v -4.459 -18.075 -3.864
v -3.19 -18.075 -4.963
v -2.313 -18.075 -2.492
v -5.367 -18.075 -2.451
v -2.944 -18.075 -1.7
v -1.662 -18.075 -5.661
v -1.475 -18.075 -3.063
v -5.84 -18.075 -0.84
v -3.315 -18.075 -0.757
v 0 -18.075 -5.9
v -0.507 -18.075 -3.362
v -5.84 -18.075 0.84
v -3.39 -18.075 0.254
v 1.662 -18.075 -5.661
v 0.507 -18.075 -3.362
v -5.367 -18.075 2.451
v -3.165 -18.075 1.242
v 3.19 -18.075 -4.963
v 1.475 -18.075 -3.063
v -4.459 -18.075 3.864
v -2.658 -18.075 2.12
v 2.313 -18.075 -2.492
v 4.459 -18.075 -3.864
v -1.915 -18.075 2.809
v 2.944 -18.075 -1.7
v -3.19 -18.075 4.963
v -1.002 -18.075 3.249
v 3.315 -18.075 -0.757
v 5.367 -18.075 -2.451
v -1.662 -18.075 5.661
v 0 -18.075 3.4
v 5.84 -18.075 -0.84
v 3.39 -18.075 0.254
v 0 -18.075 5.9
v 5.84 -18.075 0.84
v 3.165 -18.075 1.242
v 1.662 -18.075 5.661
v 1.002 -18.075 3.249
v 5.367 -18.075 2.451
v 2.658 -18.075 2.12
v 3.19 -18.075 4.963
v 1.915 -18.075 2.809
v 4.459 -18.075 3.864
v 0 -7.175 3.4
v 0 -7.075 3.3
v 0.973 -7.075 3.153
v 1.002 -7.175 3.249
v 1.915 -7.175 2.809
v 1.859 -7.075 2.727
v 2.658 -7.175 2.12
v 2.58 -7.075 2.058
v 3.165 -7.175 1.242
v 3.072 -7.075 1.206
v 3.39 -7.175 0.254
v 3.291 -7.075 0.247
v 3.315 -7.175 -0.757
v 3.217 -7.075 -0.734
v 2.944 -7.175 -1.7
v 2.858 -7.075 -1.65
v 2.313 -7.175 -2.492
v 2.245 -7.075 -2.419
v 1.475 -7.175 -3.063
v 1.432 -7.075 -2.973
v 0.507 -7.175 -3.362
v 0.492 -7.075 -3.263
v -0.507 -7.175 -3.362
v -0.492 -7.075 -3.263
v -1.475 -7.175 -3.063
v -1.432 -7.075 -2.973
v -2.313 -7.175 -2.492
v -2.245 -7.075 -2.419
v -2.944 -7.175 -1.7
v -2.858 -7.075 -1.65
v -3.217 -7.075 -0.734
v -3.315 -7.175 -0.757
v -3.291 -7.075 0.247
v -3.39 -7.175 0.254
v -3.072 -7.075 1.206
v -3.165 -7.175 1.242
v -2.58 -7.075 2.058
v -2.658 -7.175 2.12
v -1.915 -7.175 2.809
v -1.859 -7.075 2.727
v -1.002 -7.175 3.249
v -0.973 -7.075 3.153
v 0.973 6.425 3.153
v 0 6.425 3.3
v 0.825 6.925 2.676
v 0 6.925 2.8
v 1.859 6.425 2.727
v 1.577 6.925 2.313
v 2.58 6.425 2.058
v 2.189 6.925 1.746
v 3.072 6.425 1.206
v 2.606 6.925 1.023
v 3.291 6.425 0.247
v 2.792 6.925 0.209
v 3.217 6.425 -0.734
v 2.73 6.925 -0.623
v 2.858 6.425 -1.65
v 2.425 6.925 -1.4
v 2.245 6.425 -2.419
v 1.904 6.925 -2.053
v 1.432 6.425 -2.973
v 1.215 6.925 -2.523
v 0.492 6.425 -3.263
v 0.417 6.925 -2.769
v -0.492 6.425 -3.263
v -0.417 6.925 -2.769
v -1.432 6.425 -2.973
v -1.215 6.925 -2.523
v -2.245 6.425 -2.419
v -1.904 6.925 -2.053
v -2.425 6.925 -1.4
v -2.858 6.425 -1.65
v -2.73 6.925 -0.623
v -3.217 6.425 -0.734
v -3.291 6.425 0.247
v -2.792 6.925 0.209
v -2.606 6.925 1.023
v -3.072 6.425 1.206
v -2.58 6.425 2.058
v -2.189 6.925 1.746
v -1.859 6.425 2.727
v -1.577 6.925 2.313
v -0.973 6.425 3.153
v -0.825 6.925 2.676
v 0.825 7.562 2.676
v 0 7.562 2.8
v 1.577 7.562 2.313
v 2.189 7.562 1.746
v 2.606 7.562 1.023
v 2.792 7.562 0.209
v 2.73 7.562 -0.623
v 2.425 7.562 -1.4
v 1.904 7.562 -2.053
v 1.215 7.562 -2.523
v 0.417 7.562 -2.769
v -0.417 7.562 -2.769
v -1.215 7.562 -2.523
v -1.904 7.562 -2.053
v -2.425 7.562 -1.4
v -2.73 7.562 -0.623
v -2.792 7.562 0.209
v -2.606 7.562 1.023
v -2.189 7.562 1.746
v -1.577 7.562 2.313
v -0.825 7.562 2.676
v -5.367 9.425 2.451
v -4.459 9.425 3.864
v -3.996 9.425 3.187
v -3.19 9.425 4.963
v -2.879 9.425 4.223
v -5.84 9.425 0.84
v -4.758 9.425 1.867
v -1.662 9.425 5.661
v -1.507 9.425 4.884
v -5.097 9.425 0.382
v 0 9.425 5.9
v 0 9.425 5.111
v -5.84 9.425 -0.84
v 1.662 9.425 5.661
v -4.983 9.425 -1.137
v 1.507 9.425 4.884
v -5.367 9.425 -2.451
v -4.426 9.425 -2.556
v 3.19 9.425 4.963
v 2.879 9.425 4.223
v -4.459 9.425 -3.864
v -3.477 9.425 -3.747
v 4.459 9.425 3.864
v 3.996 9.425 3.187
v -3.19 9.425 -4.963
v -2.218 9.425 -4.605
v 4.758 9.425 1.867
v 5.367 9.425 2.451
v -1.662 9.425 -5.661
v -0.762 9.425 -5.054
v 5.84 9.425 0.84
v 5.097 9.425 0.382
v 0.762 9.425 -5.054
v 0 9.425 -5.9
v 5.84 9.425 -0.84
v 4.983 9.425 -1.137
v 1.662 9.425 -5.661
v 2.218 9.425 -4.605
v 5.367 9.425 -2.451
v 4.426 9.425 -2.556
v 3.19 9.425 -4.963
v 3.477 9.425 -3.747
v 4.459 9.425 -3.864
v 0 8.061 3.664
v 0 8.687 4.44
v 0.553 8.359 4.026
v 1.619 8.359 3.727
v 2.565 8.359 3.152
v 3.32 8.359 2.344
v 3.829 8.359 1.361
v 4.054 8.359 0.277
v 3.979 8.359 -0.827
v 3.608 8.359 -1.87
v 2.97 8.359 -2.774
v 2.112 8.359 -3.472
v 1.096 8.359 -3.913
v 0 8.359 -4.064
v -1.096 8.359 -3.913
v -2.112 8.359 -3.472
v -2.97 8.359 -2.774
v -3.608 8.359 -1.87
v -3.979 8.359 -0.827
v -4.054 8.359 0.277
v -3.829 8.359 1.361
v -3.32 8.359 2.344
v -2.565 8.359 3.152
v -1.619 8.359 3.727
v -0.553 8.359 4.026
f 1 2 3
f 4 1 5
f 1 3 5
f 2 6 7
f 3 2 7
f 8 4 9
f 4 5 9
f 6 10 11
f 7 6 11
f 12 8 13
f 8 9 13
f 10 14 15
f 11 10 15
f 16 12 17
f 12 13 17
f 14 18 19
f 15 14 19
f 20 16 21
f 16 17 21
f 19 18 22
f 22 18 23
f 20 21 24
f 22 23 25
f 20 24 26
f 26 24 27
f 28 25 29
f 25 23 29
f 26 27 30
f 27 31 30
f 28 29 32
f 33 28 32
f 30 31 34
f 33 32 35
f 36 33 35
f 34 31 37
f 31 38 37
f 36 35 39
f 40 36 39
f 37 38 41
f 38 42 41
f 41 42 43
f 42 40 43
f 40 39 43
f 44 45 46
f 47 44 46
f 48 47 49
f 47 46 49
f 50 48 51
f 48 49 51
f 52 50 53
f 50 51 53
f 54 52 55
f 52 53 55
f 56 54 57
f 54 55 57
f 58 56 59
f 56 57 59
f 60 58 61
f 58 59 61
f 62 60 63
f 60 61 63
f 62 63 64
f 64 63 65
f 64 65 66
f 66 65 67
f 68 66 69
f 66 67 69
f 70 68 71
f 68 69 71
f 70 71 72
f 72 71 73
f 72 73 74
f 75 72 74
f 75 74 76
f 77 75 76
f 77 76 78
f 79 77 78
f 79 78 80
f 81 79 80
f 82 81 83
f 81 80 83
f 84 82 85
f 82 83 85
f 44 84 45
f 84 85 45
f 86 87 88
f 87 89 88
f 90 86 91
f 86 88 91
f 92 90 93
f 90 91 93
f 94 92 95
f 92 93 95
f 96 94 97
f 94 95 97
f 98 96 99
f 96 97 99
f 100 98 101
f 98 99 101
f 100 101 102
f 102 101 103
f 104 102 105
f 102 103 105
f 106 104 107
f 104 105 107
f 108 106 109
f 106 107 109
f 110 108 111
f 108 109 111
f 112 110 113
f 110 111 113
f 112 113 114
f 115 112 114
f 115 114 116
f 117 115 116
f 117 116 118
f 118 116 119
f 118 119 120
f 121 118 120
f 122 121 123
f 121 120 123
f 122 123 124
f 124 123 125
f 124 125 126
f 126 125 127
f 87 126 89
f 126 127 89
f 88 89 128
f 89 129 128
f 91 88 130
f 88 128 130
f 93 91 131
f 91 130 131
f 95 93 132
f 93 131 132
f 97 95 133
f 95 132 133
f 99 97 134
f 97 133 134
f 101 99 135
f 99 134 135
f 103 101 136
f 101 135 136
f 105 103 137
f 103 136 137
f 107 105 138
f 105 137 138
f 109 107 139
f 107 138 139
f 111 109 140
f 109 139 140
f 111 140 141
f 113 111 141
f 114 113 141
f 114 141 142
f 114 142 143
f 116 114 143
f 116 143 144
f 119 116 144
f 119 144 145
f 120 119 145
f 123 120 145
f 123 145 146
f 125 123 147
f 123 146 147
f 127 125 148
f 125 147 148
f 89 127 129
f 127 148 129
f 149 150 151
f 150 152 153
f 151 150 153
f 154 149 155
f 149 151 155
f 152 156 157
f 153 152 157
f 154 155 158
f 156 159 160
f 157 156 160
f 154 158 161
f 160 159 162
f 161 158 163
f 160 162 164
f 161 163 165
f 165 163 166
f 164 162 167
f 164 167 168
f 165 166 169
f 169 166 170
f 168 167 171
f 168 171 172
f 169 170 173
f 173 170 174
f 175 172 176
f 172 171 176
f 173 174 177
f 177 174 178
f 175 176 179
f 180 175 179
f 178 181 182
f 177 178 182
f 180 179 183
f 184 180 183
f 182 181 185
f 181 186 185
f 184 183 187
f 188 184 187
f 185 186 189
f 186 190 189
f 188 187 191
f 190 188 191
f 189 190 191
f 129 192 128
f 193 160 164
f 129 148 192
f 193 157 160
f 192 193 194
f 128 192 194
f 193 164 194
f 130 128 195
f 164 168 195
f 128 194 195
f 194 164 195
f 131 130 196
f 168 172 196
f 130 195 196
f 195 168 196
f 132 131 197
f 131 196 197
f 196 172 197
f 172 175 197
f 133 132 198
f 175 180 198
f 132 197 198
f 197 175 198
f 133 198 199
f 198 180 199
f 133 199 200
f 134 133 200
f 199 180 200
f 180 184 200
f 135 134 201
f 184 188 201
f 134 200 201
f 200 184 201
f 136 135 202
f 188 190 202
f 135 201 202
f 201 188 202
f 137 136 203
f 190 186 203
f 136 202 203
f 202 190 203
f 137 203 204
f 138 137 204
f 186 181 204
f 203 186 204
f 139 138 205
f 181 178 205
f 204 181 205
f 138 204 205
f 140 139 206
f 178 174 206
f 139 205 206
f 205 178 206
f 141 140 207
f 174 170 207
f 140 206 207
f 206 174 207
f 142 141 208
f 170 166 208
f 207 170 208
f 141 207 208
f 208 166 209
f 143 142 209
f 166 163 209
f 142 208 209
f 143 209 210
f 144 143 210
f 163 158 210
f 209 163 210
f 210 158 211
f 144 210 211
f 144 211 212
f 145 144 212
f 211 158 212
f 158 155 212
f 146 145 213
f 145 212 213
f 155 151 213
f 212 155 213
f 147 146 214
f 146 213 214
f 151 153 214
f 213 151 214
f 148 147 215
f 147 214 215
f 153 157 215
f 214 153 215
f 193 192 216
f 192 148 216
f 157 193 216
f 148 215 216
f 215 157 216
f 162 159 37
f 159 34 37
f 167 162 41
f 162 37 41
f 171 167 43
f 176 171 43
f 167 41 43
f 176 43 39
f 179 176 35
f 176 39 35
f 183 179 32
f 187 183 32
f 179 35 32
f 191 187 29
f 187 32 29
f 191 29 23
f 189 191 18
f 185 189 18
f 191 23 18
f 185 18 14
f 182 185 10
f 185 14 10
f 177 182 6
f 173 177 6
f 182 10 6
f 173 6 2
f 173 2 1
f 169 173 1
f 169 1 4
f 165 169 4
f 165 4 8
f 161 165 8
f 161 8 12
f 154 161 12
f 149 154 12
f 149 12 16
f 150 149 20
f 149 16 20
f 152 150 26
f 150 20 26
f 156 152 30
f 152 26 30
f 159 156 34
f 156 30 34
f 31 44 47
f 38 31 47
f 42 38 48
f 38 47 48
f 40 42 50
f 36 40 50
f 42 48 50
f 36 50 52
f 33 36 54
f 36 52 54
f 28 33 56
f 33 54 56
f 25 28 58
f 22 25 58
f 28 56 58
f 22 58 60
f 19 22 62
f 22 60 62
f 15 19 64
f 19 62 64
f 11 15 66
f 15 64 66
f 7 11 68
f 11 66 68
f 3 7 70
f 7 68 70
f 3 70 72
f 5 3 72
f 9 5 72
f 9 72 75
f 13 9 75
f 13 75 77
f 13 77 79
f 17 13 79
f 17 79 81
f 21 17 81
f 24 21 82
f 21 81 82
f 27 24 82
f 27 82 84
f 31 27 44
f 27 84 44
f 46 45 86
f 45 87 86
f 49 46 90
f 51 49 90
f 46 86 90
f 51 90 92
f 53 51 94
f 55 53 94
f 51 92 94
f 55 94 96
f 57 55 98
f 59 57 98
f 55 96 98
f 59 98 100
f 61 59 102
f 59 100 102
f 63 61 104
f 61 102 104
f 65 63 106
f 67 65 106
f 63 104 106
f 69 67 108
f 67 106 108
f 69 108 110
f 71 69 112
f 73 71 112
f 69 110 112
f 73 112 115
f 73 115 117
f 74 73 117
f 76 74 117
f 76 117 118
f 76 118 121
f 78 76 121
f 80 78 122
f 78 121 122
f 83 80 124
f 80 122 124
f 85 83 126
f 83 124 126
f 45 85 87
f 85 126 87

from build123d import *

# Parameters (mm, degrees)
F2_SIZE = 0.09999


# Not quite as in the source:
# - a fillet or chamfer is up to 0.001 mm smaller than in the source, because OpenCascade refuses the exact size


with BuildPart() as f1:
    # F0 (on Right) → F1 (revolve)
    with BuildSketch(Plane.YZ):
        Polygon((6.425, 3.3), (6.925, 2.8), (6.925, 3.3), align=None)
        with BuildLine():
            ThreePointArc((7.5617104388, 2.8), (8.3591026496, 4.0638625595), (9.425, 5.1112620751))
            Line((9.425, 5.1112620751), (9.425, 5.9))
            Line((9.425, 5.9), (-18.075, 5.9))
            Line((-18.075, 5.9), (-18.075, 3.4))
            Line((-18.075, 3.4), (-7.075, 3.4))
            Line((-7.075, 3.4), (-7.075, 3.3))
            Line((-7.075, 3.3), (-6.425, 3.3))
            Line((-6.425, 3.3), (6.425, 3.3))
            Line((6.425, 3.3), (6.925, 3.3))
            Line((6.925, 3.3), (6.925, 2.8))
            Line((6.925, 2.8), (7.5617104388, 2.8))
        make_face()
    revolve(axis=Axis((0, 1.2040399015, 0), (0, 1, 0)))

    # F2 (size 0.1 in the source; OpenCascade refuses exactly that, so slightly less here)
    f2_edges = [f1.edges().sort_by_distance(p)[0] for p in [
        (0, -7.075, -3.4),
    ]]
    chamfer(f2_edges, length=F2_SIZE)


solid = f1.part
